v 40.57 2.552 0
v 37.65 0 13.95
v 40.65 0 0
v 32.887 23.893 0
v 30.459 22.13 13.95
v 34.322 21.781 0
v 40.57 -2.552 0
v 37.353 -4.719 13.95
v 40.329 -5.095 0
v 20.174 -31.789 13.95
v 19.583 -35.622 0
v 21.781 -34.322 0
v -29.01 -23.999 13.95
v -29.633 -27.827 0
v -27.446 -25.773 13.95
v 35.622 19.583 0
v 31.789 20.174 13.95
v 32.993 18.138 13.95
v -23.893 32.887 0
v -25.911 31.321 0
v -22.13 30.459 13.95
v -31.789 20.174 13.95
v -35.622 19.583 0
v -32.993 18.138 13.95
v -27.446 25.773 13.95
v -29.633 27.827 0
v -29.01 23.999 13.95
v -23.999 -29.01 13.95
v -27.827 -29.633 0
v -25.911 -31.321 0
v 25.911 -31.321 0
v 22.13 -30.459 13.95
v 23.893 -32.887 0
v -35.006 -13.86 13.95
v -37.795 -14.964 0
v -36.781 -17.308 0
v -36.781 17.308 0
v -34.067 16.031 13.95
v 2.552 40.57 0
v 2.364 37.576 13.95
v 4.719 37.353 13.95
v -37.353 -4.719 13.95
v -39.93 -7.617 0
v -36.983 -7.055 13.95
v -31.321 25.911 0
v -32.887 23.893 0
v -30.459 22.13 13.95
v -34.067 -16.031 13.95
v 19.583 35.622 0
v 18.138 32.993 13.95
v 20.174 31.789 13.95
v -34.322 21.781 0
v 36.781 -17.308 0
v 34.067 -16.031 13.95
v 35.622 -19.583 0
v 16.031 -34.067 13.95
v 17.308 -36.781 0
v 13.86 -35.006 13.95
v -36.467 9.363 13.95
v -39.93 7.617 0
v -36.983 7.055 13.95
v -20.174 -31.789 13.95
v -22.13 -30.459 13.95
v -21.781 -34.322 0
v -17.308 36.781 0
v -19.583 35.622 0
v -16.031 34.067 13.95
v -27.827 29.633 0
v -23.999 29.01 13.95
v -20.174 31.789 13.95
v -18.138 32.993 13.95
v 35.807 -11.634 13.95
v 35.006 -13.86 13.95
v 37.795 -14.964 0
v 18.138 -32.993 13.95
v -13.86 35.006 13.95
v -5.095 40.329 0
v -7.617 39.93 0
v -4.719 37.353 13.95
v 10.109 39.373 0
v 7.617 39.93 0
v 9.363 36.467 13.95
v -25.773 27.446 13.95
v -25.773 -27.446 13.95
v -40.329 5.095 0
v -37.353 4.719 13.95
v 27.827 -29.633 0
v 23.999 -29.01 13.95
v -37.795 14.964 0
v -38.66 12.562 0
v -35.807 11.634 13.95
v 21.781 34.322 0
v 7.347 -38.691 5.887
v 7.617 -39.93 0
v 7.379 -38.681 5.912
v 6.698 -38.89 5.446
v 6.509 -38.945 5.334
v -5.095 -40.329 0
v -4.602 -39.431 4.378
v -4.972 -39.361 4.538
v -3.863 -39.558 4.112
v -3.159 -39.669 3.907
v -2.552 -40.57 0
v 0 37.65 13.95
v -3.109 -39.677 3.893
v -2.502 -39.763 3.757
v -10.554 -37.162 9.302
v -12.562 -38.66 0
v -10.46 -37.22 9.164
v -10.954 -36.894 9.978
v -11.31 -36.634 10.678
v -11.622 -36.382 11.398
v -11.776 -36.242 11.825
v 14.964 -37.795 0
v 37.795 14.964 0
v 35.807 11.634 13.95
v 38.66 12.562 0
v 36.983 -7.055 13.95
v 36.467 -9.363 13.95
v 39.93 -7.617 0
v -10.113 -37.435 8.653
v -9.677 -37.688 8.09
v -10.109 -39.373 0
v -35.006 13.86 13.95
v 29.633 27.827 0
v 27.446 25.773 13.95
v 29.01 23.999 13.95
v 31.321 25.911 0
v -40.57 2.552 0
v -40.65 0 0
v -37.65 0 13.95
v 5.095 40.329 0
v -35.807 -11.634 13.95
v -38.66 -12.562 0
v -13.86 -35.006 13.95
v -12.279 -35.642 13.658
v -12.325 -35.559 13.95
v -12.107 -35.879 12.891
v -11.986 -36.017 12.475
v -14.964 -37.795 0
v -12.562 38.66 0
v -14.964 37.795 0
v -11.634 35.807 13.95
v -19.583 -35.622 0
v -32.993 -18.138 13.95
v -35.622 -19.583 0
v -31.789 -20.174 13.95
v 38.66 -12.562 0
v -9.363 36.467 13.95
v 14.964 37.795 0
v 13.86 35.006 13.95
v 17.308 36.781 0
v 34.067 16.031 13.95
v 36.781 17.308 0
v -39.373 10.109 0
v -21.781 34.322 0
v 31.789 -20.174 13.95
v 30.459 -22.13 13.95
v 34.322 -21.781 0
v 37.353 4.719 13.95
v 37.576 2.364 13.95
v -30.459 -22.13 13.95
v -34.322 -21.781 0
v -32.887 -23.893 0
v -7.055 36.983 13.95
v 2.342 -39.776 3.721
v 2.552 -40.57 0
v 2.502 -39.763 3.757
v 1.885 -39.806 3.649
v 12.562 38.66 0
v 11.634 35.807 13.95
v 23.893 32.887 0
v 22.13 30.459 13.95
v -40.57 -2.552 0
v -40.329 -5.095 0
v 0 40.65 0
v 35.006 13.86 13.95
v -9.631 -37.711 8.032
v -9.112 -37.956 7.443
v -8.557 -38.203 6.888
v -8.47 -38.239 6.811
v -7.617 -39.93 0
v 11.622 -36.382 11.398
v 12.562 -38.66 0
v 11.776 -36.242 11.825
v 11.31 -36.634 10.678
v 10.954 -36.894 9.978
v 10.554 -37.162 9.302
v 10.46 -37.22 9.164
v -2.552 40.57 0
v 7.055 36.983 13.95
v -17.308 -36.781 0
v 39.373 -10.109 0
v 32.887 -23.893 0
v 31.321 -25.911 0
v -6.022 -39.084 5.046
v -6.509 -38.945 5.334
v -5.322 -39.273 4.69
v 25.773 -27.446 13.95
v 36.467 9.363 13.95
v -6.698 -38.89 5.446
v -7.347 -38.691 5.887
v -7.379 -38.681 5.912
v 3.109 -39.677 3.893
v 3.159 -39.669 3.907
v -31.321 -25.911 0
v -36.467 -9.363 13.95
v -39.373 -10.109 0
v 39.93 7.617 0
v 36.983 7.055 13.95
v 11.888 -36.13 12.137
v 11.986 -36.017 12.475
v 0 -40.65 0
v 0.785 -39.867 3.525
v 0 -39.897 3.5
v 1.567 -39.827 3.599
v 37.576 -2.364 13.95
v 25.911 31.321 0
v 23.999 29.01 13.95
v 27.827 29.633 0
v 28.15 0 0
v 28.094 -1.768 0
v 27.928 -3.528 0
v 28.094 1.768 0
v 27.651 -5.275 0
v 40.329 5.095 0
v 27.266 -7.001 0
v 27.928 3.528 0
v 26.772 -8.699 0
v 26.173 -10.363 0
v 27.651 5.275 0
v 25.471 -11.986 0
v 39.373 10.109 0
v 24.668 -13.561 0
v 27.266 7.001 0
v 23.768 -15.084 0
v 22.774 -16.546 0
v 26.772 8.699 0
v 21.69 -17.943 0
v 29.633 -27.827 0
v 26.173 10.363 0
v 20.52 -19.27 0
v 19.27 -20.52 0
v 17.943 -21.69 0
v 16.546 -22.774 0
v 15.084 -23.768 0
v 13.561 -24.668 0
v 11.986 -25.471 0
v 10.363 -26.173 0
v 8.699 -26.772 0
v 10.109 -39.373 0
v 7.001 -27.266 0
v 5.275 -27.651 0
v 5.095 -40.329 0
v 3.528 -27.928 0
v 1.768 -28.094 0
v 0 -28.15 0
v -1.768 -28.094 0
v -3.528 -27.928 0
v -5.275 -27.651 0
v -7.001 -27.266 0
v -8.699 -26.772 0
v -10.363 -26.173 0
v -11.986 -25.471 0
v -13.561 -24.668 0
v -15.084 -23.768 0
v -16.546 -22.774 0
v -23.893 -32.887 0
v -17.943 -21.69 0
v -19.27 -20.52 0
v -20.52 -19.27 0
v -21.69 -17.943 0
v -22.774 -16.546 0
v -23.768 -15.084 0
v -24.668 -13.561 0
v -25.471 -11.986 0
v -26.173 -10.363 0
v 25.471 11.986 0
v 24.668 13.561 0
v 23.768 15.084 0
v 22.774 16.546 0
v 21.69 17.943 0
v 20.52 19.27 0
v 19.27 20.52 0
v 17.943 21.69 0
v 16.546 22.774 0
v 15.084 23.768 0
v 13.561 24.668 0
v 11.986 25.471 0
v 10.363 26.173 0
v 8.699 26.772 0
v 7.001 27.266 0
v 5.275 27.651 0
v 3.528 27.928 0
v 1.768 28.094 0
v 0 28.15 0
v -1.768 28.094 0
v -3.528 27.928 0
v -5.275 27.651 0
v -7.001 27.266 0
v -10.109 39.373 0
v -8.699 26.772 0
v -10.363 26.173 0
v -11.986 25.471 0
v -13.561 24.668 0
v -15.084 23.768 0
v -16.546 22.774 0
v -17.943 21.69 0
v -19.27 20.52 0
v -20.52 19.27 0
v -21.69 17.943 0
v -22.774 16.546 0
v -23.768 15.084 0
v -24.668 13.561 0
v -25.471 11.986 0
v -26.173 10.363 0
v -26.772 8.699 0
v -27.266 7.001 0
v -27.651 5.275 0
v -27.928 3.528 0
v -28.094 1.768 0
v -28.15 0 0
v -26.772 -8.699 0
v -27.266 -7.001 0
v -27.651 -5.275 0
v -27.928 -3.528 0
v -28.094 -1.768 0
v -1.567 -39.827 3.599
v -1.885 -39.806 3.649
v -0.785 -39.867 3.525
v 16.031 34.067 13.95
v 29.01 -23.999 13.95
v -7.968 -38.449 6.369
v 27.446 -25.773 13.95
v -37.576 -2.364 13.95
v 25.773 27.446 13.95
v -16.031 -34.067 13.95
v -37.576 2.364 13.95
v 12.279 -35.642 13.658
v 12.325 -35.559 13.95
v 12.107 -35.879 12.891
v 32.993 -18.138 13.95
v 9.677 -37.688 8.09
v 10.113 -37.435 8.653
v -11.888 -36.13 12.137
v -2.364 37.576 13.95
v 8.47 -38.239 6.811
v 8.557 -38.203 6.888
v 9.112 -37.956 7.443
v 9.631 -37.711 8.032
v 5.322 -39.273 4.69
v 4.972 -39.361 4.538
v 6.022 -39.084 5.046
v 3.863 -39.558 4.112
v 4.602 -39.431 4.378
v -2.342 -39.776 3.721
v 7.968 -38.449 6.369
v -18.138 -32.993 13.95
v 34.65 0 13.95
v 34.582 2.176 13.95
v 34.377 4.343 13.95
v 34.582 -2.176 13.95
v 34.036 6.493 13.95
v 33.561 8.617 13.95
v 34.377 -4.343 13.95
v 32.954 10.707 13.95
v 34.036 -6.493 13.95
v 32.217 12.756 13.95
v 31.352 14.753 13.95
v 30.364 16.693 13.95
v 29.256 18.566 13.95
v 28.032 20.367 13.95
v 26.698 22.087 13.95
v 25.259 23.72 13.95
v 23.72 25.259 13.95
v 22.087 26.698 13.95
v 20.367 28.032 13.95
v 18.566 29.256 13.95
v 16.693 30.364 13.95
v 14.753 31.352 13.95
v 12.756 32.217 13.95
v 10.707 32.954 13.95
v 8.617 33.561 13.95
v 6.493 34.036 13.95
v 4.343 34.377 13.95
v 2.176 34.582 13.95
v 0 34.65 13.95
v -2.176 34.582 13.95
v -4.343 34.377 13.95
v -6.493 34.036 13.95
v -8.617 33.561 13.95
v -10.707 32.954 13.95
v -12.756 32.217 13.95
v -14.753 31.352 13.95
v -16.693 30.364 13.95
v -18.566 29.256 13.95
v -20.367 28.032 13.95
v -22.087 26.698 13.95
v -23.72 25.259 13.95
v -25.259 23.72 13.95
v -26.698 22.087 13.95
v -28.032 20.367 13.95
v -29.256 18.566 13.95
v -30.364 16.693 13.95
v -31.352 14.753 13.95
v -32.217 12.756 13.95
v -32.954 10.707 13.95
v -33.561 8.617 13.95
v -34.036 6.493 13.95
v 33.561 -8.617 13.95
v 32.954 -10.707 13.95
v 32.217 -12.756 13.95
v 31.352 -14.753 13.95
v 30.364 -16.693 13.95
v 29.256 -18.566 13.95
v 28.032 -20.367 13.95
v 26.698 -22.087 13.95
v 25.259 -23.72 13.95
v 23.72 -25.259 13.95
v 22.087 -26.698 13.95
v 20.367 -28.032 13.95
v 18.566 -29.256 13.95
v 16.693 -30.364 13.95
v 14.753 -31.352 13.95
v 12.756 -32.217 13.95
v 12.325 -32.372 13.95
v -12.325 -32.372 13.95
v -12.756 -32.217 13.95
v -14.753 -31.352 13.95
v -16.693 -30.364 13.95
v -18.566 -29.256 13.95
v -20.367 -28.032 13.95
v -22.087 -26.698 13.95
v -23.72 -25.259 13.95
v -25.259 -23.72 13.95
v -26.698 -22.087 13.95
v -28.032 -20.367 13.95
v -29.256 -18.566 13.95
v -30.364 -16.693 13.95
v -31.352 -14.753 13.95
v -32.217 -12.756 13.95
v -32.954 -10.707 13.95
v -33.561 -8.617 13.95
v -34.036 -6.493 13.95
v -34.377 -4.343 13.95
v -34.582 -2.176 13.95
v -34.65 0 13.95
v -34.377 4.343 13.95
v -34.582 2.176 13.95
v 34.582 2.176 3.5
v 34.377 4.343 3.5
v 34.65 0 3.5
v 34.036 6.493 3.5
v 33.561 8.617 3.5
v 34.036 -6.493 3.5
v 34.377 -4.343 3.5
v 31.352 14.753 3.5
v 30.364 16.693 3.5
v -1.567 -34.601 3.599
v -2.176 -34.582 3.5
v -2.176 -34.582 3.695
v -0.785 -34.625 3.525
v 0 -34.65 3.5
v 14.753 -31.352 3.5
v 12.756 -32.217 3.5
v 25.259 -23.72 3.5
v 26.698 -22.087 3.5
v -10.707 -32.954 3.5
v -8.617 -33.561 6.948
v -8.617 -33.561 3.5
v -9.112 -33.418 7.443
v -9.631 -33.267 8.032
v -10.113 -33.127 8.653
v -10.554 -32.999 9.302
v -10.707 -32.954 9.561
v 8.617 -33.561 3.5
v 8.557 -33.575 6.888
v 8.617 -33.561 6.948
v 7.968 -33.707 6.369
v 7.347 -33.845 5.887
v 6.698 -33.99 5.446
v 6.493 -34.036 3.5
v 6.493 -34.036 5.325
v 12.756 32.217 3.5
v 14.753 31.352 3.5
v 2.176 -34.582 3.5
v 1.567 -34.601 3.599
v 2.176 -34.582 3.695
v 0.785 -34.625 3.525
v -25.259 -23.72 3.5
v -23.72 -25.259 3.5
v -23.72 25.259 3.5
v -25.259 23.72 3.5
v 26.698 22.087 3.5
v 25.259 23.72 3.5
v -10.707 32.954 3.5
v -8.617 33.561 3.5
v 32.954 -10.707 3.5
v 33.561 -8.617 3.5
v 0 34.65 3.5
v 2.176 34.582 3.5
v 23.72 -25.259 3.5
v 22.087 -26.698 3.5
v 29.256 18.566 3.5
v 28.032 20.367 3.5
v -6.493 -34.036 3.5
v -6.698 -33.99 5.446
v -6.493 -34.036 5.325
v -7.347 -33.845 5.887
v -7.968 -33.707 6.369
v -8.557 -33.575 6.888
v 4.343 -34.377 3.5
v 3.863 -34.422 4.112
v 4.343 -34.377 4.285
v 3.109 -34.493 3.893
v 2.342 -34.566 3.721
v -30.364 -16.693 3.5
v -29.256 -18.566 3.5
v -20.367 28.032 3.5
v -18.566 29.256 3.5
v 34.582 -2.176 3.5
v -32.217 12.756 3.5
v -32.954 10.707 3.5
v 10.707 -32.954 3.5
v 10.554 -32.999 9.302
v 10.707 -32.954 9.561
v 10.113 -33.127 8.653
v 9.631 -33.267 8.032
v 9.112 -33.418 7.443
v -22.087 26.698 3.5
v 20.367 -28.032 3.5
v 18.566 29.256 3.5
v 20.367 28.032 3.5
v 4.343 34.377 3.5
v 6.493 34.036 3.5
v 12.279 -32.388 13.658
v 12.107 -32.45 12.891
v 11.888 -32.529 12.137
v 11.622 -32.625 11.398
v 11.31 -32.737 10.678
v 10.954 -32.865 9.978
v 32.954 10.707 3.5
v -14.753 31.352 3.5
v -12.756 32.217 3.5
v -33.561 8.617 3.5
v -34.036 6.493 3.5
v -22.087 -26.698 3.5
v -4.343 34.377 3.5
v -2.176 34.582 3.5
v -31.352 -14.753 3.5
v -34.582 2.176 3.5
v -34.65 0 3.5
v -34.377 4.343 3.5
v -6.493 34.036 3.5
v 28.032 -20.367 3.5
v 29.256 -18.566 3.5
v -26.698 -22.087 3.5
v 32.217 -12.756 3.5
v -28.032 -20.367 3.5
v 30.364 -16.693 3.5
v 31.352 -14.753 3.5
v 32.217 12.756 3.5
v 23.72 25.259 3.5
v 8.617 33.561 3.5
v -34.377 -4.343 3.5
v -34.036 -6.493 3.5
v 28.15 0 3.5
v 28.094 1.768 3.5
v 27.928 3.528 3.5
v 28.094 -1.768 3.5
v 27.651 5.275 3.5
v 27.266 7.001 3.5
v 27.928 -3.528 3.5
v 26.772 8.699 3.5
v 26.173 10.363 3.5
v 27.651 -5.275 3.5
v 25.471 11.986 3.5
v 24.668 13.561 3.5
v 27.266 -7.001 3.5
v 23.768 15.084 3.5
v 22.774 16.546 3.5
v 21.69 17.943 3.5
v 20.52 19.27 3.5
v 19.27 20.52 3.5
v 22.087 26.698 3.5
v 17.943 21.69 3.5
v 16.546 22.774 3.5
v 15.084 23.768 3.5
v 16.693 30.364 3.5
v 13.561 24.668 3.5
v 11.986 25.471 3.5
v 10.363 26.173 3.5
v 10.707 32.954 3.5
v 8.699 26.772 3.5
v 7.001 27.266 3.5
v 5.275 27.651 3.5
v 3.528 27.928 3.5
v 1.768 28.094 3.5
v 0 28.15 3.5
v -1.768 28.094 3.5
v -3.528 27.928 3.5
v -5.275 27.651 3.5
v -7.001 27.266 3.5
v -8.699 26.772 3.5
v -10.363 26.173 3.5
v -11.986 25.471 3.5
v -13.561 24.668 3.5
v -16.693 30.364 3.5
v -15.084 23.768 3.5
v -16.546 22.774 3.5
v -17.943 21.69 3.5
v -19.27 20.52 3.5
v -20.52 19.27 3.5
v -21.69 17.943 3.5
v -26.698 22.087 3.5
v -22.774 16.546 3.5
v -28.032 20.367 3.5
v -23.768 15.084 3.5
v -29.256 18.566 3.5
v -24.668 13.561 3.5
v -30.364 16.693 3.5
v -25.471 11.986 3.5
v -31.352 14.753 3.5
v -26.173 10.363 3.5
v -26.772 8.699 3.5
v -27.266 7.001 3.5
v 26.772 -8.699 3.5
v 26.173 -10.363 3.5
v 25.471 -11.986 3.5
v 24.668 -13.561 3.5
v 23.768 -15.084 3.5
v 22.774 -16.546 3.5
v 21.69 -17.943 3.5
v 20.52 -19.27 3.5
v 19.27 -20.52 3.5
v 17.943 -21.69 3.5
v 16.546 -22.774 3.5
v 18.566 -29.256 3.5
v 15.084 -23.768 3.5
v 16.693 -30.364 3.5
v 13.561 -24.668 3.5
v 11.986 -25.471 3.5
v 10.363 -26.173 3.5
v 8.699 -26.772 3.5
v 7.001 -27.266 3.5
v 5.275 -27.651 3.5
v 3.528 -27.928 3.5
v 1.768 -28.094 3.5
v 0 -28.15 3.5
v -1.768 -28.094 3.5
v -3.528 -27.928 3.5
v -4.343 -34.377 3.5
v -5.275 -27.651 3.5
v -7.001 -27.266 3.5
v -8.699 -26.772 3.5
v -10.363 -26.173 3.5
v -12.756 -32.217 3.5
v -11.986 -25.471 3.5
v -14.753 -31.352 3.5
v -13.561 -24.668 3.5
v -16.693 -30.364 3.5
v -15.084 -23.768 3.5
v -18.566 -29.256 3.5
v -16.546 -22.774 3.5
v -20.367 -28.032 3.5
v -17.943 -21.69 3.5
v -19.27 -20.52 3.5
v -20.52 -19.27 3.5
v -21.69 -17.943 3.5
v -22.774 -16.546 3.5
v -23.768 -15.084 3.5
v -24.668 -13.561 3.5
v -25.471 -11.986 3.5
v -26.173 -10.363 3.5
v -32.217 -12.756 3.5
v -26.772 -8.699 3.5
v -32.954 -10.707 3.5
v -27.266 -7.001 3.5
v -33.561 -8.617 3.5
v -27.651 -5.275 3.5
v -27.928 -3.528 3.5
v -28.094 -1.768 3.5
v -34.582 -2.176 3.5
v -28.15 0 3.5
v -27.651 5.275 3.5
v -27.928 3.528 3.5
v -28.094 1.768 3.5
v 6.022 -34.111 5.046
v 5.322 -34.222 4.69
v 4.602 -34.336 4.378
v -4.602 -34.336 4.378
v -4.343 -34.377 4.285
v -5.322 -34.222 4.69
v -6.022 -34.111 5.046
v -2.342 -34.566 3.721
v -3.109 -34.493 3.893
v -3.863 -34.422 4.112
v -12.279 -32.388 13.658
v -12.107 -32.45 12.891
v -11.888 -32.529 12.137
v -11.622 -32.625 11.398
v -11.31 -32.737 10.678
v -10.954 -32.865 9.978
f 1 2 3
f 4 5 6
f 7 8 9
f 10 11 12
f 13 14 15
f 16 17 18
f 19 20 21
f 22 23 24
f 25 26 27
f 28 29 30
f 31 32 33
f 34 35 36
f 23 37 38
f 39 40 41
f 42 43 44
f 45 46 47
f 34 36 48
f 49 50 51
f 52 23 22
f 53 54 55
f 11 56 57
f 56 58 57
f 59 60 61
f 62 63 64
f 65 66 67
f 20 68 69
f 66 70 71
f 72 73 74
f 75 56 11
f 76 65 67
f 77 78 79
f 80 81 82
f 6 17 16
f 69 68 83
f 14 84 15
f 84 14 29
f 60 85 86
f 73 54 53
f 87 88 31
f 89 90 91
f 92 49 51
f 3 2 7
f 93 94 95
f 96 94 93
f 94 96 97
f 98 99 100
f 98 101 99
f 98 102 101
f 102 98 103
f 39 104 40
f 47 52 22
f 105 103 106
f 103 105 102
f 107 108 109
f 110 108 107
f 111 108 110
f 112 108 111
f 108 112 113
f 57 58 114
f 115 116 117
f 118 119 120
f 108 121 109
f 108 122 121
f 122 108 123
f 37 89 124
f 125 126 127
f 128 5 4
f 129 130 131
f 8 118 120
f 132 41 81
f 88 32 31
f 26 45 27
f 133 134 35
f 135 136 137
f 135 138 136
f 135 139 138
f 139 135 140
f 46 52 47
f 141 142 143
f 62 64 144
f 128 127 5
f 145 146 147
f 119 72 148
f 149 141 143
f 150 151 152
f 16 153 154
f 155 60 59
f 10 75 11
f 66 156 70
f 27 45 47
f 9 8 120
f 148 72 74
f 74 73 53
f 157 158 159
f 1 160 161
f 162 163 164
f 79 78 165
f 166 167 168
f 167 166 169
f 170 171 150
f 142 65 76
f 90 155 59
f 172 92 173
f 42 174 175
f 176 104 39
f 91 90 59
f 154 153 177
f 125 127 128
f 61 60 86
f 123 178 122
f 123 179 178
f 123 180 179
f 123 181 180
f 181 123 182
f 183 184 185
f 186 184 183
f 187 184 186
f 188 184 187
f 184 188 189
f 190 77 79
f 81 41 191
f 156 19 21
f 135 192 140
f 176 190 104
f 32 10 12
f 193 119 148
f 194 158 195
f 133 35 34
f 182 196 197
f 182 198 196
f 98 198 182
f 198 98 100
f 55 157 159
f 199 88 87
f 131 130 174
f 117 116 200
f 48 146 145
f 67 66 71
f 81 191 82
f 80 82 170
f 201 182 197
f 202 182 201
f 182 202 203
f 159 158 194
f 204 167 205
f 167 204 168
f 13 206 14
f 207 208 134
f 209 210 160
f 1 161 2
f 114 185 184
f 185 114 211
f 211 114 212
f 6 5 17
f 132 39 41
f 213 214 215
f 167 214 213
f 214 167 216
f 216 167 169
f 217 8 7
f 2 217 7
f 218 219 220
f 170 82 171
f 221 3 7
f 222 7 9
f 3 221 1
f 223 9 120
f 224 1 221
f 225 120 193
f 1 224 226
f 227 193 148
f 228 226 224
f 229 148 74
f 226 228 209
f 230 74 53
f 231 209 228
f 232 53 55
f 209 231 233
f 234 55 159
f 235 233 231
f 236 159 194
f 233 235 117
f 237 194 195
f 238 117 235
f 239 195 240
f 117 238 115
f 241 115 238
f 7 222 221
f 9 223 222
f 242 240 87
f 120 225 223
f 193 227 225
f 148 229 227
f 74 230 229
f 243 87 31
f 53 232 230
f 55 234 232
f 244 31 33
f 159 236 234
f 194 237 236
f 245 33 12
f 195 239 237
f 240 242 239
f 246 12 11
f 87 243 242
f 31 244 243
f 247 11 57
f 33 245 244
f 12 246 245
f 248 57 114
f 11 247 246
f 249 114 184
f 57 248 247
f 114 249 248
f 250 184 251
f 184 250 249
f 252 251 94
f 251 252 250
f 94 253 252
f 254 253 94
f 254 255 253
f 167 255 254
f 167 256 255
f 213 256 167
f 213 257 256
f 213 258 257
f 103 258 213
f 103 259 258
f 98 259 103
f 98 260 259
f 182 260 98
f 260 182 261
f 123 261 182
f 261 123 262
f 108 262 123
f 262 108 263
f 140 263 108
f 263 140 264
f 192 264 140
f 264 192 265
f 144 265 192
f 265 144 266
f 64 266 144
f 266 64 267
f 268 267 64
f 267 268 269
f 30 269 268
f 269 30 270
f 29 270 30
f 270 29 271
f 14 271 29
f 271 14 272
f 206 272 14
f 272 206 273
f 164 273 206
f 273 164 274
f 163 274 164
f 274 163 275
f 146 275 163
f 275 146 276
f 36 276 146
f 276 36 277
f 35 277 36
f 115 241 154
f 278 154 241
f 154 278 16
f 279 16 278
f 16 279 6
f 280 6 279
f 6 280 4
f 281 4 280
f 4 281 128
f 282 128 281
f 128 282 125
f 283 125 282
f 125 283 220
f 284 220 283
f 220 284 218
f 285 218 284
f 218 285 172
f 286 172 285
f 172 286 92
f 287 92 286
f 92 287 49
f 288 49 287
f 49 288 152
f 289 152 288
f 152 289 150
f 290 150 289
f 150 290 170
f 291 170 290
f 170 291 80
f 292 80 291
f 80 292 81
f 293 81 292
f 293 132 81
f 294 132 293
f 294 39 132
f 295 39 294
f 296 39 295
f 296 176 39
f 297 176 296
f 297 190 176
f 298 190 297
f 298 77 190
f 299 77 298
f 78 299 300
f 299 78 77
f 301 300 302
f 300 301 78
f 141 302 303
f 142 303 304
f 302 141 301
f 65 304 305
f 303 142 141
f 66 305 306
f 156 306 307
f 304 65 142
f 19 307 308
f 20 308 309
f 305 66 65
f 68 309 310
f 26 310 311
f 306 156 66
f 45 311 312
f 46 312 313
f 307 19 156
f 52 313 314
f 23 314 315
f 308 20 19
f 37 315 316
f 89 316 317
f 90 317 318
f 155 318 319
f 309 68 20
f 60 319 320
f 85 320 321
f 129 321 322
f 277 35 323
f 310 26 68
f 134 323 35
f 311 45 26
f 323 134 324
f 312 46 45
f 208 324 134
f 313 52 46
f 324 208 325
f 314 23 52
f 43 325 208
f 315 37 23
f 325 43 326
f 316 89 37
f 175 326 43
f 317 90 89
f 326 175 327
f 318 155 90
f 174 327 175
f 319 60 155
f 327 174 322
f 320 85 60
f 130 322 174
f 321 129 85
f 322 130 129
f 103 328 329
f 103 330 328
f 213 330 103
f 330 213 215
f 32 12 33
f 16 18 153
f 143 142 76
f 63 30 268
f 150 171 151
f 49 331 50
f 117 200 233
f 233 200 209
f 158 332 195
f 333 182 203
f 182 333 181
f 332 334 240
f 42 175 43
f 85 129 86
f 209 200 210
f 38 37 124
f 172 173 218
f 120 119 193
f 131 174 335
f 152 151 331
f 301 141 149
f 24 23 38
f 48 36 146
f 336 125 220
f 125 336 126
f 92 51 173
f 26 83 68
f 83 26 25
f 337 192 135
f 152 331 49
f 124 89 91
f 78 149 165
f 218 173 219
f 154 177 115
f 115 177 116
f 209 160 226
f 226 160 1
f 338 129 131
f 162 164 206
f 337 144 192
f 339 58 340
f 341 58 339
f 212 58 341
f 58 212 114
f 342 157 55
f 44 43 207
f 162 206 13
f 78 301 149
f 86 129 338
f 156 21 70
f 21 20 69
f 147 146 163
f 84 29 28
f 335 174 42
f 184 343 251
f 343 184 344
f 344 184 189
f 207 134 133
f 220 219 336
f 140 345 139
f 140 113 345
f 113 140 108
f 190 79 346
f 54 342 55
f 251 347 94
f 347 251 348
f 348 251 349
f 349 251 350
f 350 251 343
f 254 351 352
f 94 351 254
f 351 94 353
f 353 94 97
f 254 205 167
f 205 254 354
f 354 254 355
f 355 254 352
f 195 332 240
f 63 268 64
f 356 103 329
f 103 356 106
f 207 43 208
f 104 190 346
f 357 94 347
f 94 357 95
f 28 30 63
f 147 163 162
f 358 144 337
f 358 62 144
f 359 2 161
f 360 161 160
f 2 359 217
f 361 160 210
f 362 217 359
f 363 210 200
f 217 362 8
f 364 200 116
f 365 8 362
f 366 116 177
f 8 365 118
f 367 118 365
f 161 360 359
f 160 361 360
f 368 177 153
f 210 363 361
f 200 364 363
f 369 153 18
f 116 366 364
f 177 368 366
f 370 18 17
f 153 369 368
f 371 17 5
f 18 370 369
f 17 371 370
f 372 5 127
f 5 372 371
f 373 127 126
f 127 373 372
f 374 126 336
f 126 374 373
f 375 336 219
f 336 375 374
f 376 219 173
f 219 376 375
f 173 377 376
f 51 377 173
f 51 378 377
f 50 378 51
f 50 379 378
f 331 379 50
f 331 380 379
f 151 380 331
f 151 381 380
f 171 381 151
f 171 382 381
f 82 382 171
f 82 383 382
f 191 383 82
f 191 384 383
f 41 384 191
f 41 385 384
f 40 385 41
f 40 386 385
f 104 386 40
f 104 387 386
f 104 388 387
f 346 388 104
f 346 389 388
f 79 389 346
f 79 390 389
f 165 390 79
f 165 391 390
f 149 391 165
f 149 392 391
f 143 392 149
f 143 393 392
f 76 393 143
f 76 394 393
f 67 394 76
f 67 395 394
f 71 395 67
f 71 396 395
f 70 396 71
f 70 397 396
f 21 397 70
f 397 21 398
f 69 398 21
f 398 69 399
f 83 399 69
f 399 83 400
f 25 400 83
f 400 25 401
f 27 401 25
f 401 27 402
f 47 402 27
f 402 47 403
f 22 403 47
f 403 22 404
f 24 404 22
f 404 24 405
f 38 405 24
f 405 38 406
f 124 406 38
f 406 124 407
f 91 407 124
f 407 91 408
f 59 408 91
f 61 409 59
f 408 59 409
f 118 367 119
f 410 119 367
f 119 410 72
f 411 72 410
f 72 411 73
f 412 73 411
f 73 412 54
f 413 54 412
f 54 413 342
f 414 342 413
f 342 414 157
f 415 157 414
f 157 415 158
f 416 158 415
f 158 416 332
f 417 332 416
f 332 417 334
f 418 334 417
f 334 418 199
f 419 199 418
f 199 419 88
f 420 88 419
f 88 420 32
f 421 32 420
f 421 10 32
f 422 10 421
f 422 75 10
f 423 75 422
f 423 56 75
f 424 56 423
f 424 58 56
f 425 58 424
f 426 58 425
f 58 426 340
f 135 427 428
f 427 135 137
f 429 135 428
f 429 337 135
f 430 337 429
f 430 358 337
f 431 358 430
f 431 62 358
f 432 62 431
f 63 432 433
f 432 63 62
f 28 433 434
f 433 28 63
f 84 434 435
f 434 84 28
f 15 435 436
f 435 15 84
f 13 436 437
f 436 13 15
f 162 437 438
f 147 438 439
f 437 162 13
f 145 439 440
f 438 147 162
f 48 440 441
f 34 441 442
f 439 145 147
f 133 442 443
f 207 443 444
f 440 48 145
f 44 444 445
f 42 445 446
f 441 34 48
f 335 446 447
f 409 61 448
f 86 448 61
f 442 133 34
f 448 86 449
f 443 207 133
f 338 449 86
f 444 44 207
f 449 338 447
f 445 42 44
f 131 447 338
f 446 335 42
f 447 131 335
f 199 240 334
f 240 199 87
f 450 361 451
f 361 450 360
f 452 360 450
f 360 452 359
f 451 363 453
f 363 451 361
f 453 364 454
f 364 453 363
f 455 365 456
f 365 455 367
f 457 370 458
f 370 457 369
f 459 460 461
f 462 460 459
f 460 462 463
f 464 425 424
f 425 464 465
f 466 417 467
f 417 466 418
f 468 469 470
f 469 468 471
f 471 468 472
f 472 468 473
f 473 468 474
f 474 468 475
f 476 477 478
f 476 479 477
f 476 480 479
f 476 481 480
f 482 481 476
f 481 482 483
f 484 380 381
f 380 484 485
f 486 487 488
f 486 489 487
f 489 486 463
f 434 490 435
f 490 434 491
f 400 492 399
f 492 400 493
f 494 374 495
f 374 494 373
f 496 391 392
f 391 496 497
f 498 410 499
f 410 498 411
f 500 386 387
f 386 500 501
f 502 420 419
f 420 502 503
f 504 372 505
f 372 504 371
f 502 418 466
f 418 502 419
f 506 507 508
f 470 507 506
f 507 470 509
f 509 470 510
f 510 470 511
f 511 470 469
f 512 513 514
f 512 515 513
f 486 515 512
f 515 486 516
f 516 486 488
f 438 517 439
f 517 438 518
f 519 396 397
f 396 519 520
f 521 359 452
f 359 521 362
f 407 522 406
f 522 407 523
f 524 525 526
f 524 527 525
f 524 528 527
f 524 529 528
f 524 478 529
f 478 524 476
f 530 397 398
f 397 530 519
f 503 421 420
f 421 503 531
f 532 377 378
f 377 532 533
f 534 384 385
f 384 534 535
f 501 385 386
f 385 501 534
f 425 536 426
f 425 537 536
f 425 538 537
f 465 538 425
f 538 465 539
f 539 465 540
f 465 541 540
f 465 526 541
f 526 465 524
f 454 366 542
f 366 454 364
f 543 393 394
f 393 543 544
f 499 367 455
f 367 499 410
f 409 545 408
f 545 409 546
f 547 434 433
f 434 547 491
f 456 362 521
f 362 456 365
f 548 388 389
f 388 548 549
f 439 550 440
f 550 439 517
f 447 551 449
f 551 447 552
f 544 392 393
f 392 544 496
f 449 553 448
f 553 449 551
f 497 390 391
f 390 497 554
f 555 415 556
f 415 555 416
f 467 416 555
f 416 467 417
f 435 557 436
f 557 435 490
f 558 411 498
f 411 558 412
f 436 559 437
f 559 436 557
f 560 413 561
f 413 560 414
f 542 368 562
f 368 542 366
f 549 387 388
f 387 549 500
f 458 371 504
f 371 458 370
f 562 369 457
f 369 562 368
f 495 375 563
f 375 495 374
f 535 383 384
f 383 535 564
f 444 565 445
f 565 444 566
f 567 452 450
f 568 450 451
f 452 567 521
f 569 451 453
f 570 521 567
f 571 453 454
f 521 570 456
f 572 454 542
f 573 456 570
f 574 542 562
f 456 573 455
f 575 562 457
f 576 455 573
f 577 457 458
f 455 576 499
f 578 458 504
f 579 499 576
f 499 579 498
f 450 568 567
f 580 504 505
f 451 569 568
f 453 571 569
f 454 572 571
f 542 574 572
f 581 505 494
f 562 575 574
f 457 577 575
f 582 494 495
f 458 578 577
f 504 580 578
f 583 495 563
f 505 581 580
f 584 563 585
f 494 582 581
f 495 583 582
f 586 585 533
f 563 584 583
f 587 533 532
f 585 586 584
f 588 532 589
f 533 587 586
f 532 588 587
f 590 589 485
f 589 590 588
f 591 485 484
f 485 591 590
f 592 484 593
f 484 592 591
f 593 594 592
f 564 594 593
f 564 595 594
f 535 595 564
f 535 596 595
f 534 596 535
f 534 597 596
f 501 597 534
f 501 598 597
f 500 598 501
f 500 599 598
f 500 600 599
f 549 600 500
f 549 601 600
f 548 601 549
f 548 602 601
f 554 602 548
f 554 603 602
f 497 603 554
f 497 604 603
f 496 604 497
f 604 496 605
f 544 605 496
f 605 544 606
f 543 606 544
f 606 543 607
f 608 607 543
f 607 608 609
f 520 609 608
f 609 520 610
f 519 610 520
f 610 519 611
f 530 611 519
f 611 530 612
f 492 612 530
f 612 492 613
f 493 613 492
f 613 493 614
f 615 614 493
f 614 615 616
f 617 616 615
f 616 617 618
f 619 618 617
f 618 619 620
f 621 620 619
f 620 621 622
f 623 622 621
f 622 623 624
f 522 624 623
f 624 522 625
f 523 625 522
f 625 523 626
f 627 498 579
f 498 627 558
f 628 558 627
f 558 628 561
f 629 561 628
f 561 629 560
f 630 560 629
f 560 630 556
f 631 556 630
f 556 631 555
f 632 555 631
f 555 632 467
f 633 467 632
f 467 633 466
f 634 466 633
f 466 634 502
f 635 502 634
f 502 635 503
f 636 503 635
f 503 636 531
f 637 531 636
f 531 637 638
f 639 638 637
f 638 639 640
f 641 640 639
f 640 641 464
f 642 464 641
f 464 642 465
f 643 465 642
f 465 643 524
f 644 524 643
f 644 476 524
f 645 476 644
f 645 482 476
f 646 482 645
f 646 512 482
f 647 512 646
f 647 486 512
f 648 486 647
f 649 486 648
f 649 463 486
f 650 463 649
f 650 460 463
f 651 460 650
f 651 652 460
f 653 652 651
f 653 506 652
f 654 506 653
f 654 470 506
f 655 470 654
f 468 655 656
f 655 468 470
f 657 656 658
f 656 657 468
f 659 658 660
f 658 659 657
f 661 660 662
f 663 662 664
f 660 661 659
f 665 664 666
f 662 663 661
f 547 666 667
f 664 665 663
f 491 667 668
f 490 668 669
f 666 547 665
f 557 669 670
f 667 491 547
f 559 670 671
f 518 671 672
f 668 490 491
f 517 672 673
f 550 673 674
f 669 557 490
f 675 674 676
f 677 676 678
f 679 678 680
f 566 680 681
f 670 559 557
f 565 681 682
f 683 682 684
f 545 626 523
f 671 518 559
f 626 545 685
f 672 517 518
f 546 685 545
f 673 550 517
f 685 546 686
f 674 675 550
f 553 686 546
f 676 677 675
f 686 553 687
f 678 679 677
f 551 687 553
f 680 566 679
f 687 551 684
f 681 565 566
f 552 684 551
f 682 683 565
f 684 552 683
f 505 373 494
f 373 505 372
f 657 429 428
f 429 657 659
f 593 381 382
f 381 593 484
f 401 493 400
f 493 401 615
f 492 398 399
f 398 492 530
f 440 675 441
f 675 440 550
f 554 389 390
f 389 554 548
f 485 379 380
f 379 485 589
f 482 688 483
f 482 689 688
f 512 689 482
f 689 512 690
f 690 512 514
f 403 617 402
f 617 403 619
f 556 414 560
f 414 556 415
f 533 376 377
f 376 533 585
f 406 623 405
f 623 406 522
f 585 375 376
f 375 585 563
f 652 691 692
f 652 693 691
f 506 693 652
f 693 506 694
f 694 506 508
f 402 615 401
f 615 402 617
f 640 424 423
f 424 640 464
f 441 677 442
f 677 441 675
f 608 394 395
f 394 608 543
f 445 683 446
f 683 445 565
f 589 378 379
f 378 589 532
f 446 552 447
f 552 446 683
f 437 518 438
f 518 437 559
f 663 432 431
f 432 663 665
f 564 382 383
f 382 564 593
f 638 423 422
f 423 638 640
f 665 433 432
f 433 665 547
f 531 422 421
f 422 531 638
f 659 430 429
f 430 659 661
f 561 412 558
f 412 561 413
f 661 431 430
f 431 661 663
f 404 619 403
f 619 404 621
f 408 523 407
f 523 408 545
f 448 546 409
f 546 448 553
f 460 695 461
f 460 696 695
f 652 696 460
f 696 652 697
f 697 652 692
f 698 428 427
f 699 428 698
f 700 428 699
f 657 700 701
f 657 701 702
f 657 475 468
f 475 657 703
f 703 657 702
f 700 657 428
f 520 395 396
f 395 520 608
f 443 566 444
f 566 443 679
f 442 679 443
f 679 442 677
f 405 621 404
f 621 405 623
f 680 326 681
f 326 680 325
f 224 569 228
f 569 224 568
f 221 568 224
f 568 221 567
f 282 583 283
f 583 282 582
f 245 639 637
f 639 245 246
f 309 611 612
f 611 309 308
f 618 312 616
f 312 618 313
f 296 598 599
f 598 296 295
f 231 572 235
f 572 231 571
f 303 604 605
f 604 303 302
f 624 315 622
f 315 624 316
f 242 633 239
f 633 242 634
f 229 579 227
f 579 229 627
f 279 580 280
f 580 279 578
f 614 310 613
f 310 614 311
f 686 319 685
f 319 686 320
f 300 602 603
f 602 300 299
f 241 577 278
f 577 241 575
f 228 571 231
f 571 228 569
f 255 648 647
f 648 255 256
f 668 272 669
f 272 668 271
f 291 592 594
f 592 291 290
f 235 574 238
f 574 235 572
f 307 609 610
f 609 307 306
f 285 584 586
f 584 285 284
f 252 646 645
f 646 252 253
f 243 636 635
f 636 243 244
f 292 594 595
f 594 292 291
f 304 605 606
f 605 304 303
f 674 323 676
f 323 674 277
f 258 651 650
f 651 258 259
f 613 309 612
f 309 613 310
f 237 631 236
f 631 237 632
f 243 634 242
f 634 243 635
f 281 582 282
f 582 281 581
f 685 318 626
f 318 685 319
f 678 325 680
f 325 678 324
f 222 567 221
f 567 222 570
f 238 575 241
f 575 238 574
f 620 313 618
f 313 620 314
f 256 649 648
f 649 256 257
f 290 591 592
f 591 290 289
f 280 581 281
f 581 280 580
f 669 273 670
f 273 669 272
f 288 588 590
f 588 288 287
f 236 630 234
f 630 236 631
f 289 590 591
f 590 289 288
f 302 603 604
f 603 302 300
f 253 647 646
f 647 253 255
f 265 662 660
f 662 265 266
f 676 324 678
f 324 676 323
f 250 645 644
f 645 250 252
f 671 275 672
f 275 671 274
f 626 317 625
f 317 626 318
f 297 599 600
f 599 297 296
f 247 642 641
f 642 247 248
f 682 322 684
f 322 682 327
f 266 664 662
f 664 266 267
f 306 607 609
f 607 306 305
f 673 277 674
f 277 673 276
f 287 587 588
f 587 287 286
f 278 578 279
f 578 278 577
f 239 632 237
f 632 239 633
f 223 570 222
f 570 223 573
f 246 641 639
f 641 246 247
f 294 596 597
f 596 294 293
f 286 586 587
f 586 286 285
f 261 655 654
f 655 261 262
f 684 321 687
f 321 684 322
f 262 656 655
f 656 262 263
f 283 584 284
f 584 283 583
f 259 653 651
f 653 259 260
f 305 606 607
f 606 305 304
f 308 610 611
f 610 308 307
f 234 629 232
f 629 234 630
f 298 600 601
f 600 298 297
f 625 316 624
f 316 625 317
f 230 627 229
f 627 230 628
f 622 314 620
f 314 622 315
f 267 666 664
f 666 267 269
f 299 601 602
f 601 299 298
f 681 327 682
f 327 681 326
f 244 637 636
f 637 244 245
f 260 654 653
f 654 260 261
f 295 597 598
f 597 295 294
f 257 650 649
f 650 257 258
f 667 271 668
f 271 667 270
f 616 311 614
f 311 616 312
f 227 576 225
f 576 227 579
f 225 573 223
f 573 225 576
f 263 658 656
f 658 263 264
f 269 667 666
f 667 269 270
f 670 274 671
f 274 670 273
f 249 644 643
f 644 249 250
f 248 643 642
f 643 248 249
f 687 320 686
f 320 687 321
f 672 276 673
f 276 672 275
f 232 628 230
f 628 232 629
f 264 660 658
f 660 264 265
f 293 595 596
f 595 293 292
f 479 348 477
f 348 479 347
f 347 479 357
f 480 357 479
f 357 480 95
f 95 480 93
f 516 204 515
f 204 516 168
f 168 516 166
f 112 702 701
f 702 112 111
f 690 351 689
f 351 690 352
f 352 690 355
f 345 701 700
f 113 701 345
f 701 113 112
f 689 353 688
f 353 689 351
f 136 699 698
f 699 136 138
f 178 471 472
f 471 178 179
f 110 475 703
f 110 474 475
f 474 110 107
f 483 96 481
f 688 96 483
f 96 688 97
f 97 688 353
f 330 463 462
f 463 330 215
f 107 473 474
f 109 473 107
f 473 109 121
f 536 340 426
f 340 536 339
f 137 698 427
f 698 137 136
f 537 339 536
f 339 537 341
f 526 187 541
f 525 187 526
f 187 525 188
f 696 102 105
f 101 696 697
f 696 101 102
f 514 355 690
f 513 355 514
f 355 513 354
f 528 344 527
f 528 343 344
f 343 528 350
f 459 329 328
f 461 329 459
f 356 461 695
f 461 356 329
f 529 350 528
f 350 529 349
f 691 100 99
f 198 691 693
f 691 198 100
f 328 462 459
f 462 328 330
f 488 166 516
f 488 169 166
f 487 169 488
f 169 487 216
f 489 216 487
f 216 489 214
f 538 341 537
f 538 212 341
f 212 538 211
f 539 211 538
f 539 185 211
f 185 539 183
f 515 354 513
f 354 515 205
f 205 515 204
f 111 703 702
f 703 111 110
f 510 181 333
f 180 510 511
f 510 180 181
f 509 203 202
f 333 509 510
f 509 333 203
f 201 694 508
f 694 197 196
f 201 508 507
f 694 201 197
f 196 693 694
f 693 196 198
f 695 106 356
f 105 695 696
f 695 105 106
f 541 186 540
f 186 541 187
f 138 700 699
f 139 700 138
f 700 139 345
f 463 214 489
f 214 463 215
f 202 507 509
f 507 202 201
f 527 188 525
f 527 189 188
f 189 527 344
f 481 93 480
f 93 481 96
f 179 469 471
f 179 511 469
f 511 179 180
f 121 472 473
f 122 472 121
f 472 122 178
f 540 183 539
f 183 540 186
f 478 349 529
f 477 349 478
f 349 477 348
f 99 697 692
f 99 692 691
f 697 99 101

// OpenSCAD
// file: ../config.scad
$fn = 100;

MAGIC = 0.01; // use this value when you need solids to overlap an infinitesimal amount; enough to join them, but not enough to have any effect in the physical world
ALOT = 100; // use this value when something needs to be long enough to e.g. punch through any other geometry in the model
PUCK_DIAM = 68.3; // Trådfri remote diameter at its widest point
PUCK_THICK = 18.6; // ^ ditto, for thickness
// main file
include <../config.scad>;

// Example:
puckHolder(
  3.5,
  3.5,
  3,
  .75,
  6,
  25
);

module puckHolder(
  bodyWallThickness,
  holderWallThickness,
  holderBaseExtraThickness,
  puckHeightCoverage,
  accessHoleEdgeWidth,
  fingerHoleDiameter
) {
  difference() {

    // Main body:
    cylinder(
      h = PUCK_THICK * puckHeightCoverage,
      d1 = PUCK_DIAM + holderWallThickness * 2 + holderBaseExtraThickness * 2,
      d2 = PUCK_DIAM + holderWallThickness * 2
    );

    // Carve out space for puck:
    translate([ 0, 0, bodyWallThickness ])
    cylinder(h = PUCK_THICK, d = PUCK_DIAM + 1);

    // Carve out access hole:
    translate([ 0, 0, -MAGIC ])
    cylinder(h = ALOT, d = PUCK_DIAM - accessHoleEdgeWidth * 2);

    // Carve out finger hole:
    translate([
      0,
      PUCK_DIAM / -4,
      max(
        bodyWallThickness + fingerHoleDiameter / 2, // anchor the hole at its bottom edge (when fingerHoleDiameter is LARGE)
        PUCK_THICK * puckHeightCoverage // anchor the hole at its center axis (when fingerHoleDiameter is SMALL)
      )
    ])
    rotate([ 90, 0, 0 ])
    cylinder(d = fingerHoleDiameter, h = PUCK_DIAM / 2);

  }

}
